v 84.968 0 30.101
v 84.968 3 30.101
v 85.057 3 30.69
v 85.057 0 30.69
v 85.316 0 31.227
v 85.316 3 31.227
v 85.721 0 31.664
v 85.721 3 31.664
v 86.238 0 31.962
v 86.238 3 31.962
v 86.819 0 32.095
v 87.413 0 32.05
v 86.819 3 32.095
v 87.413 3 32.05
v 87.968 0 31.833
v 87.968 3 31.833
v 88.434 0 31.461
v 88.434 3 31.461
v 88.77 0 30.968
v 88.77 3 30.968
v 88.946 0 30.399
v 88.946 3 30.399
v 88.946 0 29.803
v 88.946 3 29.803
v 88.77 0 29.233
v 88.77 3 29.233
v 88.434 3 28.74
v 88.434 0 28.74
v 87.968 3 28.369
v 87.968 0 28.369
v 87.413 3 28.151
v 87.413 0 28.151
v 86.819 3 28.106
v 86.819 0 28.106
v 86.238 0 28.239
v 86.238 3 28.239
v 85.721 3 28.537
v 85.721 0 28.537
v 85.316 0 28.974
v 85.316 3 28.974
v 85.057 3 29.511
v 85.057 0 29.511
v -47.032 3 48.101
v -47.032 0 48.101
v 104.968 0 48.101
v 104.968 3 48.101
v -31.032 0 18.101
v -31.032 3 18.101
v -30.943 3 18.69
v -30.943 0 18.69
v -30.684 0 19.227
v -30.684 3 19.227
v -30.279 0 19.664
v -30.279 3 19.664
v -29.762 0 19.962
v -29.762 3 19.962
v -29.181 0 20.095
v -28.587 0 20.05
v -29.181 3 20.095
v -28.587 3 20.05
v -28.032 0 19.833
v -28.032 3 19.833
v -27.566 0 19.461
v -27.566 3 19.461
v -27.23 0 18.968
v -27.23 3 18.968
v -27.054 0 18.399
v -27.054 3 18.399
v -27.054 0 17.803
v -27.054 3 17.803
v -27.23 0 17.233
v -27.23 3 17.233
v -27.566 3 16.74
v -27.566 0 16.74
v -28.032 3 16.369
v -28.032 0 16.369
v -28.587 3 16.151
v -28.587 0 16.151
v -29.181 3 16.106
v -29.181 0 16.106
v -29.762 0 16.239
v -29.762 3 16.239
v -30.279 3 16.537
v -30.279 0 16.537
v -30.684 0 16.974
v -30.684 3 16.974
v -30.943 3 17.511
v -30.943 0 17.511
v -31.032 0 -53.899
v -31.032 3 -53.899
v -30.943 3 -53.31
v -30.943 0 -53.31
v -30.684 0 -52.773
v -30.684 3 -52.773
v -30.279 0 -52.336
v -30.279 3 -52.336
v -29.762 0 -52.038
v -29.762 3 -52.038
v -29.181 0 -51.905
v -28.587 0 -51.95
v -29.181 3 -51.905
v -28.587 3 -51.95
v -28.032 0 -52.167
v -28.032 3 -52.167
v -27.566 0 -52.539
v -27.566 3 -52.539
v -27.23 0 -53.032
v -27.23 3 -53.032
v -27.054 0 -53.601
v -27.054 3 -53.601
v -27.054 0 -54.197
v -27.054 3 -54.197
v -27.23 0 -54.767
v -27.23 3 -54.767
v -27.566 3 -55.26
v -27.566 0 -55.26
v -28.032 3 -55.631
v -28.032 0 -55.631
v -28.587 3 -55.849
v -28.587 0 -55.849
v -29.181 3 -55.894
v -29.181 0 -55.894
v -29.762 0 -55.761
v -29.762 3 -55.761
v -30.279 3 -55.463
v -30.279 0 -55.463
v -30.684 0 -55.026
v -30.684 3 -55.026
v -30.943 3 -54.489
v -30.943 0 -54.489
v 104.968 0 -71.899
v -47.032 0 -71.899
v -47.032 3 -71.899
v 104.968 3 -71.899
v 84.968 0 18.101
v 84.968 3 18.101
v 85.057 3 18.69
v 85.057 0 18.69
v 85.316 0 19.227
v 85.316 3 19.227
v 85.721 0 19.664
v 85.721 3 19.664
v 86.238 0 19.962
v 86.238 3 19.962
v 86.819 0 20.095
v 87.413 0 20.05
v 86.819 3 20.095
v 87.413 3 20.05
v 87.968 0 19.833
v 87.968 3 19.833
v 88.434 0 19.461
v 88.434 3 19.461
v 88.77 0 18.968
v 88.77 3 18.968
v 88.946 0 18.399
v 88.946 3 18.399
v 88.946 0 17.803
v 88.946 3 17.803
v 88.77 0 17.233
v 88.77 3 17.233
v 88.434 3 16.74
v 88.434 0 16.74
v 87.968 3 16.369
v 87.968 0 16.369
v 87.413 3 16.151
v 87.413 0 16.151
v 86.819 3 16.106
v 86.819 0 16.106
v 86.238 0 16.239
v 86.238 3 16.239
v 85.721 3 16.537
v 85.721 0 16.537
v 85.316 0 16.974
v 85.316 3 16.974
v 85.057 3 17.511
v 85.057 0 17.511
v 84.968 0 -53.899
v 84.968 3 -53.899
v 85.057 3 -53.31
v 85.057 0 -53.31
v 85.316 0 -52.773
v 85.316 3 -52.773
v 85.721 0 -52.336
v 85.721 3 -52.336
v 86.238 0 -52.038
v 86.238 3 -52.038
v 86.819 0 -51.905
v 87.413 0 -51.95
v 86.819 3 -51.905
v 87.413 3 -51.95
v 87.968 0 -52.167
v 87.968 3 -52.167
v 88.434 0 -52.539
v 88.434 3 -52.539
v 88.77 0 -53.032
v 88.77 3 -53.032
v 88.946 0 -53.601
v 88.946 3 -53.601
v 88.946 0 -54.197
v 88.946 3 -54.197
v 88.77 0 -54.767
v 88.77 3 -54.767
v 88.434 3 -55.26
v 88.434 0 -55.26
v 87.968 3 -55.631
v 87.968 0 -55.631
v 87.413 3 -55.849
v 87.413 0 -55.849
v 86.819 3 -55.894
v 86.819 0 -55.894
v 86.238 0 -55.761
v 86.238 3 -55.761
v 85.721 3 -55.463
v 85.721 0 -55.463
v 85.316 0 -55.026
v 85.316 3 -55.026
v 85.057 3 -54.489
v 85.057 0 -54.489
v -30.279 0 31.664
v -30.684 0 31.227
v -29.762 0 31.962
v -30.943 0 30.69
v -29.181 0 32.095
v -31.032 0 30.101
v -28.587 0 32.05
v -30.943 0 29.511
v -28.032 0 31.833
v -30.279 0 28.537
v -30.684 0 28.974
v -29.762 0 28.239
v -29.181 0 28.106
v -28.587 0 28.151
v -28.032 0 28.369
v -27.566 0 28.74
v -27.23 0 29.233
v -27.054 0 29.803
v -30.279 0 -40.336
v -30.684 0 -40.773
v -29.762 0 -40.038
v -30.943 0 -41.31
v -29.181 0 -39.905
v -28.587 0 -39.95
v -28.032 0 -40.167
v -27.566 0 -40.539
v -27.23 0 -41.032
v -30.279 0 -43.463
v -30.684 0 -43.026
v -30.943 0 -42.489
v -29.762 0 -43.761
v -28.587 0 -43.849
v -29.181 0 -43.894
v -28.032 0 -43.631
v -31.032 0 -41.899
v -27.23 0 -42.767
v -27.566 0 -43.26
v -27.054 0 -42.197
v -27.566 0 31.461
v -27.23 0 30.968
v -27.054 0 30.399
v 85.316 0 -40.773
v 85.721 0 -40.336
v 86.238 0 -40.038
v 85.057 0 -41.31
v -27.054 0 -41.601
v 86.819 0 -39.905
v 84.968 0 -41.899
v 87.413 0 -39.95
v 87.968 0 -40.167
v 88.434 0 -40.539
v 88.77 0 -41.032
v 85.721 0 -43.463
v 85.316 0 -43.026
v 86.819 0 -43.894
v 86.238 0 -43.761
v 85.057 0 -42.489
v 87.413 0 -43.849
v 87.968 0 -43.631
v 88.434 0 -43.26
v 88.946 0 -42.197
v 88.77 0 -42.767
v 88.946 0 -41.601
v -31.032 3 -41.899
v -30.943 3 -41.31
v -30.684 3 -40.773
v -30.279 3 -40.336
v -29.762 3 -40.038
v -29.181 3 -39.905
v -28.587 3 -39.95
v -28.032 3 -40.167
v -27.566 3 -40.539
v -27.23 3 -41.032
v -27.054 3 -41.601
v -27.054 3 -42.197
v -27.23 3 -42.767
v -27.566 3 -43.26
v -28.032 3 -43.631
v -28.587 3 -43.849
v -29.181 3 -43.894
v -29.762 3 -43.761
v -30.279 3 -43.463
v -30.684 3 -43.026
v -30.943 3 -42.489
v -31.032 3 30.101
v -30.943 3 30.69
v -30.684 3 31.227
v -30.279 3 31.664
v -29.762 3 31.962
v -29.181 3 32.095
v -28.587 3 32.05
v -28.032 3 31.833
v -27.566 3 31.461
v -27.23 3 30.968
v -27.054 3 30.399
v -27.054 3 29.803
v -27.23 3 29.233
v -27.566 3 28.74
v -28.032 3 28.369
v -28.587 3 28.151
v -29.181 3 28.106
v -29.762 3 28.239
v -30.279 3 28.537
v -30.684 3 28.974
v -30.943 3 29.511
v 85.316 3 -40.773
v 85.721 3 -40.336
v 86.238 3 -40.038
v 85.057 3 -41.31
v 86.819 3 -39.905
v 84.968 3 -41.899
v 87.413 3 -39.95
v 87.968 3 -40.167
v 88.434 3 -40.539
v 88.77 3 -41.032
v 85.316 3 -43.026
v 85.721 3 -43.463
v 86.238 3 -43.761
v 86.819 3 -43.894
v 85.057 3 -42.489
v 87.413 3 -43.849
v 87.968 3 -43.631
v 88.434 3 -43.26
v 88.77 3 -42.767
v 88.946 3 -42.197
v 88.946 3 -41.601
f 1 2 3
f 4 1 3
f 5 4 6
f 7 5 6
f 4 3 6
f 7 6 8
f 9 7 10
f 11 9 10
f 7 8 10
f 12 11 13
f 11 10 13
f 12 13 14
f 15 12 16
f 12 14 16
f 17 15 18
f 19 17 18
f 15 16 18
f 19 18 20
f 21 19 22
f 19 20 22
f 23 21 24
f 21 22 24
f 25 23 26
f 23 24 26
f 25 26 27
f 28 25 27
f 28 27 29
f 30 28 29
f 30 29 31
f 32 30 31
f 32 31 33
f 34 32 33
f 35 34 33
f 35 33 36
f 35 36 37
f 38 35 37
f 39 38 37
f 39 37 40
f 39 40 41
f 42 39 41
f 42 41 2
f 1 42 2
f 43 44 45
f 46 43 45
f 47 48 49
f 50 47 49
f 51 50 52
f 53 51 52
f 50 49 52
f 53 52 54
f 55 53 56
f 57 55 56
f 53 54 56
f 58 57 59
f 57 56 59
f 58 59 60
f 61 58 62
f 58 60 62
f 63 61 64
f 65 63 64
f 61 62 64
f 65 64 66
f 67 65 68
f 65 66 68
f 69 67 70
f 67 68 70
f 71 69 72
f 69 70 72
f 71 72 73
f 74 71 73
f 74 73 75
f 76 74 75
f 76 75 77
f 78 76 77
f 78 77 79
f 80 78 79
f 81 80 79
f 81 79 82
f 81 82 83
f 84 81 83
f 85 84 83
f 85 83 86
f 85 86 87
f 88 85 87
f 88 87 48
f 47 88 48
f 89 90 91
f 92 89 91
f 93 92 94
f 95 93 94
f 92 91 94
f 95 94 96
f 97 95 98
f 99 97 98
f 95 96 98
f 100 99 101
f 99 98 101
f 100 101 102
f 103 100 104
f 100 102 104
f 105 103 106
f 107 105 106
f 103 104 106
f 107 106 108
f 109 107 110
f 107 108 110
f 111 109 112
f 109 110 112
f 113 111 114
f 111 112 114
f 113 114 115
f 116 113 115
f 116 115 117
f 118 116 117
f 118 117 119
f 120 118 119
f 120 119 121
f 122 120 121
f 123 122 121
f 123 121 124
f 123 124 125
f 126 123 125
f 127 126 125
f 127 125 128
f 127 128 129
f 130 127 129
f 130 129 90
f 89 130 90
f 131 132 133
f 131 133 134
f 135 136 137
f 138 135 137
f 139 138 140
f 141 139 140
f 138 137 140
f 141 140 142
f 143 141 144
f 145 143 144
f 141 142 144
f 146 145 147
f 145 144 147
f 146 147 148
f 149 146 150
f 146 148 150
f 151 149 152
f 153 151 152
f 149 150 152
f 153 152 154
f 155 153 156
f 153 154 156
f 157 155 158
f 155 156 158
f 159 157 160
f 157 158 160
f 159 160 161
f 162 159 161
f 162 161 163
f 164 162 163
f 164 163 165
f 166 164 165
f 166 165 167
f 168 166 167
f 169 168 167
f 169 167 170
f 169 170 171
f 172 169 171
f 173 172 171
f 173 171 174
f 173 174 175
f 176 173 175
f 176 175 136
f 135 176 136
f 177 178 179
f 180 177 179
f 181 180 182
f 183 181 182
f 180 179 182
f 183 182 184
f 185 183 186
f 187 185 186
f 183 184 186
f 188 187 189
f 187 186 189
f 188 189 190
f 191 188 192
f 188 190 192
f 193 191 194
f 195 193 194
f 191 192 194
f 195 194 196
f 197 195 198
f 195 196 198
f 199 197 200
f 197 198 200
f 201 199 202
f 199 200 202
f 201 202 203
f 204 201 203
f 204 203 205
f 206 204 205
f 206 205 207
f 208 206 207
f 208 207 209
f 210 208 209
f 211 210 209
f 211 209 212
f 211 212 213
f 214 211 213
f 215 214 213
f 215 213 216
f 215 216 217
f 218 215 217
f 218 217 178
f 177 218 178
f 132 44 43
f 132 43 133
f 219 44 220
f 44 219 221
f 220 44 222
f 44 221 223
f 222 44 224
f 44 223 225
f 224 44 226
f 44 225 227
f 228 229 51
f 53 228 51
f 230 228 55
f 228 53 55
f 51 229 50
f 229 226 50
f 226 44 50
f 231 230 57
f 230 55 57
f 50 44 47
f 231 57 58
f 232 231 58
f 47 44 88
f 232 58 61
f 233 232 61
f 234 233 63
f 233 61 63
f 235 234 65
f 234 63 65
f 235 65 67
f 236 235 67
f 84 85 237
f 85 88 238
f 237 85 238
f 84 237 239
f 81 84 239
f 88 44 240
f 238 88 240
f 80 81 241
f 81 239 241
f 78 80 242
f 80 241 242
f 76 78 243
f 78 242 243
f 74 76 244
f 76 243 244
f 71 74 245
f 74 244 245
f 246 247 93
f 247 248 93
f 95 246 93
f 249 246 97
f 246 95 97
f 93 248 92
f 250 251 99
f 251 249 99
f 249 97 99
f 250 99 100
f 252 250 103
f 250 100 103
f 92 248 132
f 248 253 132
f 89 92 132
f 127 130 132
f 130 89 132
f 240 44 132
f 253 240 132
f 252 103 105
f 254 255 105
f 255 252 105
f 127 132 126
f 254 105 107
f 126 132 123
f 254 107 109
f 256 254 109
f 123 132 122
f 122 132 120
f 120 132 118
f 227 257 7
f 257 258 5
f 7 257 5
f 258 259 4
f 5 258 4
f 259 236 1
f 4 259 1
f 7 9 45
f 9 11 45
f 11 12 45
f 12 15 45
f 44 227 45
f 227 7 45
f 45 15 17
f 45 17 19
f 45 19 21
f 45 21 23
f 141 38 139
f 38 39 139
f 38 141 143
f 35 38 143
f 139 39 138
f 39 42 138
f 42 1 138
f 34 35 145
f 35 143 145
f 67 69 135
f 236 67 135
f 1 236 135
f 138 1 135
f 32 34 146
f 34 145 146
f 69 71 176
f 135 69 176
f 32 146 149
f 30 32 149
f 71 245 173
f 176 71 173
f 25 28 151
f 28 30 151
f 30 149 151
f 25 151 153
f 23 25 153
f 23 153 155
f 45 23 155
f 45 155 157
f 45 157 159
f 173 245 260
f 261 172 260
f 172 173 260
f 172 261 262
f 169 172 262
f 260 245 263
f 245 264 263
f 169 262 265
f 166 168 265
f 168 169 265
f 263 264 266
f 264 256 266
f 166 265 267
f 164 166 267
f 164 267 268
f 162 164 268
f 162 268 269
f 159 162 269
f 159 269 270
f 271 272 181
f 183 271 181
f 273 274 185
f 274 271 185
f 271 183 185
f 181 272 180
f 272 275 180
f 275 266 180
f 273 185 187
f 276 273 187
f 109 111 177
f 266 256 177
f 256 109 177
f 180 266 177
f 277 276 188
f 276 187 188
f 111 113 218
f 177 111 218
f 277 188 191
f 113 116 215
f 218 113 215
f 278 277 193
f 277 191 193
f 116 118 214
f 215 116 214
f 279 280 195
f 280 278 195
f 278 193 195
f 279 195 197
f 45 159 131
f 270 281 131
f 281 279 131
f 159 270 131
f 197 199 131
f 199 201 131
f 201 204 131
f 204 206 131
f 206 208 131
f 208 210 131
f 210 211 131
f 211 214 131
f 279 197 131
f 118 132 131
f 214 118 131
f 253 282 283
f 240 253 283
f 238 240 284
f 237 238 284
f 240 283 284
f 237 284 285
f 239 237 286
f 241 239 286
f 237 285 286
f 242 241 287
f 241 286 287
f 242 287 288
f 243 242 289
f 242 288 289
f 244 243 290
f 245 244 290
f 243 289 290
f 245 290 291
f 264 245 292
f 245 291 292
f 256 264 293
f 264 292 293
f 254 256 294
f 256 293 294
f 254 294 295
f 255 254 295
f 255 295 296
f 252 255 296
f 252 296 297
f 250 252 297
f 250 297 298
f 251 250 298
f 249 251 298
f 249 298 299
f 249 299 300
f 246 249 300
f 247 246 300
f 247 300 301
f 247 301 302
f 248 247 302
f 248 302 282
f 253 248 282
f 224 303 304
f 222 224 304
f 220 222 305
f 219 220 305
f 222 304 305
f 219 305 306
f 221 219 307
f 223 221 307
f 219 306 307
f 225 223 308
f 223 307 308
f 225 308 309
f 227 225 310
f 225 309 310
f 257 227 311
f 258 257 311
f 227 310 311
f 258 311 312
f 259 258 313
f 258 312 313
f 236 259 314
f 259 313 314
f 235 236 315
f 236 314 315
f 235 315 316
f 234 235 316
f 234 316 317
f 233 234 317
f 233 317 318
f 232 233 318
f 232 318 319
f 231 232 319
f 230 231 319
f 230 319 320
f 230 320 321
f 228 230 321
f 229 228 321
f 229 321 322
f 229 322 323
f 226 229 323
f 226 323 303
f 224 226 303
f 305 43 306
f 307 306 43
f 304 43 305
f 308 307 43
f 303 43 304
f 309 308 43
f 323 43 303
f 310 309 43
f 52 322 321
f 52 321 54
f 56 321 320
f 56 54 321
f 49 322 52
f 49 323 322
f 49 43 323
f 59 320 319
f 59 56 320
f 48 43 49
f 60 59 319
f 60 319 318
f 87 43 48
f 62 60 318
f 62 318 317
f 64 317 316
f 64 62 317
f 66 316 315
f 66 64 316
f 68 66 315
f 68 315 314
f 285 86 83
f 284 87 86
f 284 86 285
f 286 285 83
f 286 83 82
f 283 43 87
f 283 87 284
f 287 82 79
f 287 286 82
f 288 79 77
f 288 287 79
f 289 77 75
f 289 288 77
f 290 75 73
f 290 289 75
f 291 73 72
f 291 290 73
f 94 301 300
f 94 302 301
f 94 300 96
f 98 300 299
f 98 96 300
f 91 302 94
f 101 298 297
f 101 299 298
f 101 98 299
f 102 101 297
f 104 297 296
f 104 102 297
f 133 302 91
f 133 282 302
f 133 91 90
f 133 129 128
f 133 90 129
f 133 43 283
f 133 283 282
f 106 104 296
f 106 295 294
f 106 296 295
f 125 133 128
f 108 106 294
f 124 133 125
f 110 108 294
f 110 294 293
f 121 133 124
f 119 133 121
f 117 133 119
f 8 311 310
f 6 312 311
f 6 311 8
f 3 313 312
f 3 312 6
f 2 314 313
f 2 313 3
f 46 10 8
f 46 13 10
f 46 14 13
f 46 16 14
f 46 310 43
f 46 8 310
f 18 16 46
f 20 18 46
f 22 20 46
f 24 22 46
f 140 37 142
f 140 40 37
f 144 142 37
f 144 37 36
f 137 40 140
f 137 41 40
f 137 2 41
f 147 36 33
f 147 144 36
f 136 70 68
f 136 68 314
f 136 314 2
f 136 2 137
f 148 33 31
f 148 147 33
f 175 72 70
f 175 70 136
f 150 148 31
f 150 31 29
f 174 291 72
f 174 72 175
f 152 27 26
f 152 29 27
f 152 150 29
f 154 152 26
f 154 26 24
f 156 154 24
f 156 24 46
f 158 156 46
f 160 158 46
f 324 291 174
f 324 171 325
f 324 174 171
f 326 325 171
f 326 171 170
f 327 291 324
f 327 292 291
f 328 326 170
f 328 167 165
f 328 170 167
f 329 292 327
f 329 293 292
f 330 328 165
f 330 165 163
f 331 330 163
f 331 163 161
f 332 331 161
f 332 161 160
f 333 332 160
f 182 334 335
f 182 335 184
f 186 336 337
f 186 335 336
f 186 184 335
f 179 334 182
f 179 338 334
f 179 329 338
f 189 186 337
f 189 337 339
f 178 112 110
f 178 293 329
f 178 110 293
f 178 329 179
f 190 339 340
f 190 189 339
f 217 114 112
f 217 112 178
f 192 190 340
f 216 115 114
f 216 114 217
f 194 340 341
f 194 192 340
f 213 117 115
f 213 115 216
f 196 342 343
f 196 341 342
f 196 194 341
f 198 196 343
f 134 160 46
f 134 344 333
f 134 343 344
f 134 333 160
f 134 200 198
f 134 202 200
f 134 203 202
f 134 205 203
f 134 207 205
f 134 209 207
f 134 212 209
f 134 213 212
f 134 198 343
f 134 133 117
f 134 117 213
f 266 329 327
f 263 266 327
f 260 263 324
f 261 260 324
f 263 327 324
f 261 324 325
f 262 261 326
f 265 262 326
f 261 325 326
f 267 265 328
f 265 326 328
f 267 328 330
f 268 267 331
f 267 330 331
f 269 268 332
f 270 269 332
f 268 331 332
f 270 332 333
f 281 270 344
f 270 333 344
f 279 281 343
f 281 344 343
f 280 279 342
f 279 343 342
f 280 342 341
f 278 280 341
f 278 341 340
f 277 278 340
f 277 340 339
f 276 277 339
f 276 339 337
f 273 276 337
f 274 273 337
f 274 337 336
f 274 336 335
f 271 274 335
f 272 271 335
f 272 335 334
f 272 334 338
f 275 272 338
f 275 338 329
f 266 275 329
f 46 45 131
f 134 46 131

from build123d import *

# Parameters (mm, degrees)
SKETCH1_W           = 152
SKETCH1_H           = 120
BOSS_EXTRUDE1_DEPTH = 3
SKETCH2_R           = 2
CUT_EXTRUDE1_DEPTH  = 4
SKETCH5_R           = 2
CUT_EXTRUDE3_DEPTH  = 4
SKETCH6_R           = 2
CUT_EXTRUDE4_DEPTH  = 4


with BuildPart() as part:
    # Sketch1 → Boss-Extrude1 (new body)
    with BuildSketch(Plane(origin=(0, 0, 0), x_dir=(1, 0, 0), z_dir=(0, 1, 0))):
        with Locations((28.968311827, 11.899409823)):
            Rectangle(SKETCH1_W, SKETCH1_H)
    extrude(amount=BOSS_EXTRUDE1_DEPTH)

    # Sketch2 → Cut-Extrude1 (cut, through all)
    with BuildSketch(Plane(origin=(0, 3, 0), x_dir=(-1, 0, 0), z_dir=(0, 1, 0))):
        with Locations((-86.968311827, 30.100590177)):
            Circle(SKETCH2_R)
    extrude(amount=-CUT_EXTRUDE1_DEPTH, mode=Mode.SUBTRACT)

    # Sketch5 → Cut-Extrude3 (cut, through all)
    with BuildSketch(Plane(origin=(0, 3, 0), x_dir=(-1, 0, 0), z_dir=(0, 1, 0))):
        with Locations((-86.968311827, 18.100590177)):
            Circle(SKETCH5_R)
    extrude(amount=-CUT_EXTRUDE3_DEPTH, mode=Mode.SUBTRACT)

    # Sketch6 → Cut-Extrude4 (cut, through all)
    with BuildSketch(Plane(origin=(0, 3, 0), x_dir=(-1, 0, 0), z_dir=(0, 1, 0))):
        with Locations((-86.968311827, -41.899409823)):
            Circle(SKETCH6_R)
        with Locations((29.031688173, -53.899409823)):
            Circle(SKETCH6_R)
        with Locations((-86.968311827, -53.899409823)):
            Circle(SKETCH6_R)
        with Locations((29.031688173, -41.899409823)):
            Circle(SKETCH6_R)
        with Locations((29.031688173, 18.100590177)):
            Circle(SKETCH6_R)
        with Locations((29.031688173, 30.100590177)):
            Circle(SKETCH6_R)
    extrude(amount=-CUT_EXTRUDE4_DEPTH, mode=Mode.SUBTRACT)


solid = part.part
